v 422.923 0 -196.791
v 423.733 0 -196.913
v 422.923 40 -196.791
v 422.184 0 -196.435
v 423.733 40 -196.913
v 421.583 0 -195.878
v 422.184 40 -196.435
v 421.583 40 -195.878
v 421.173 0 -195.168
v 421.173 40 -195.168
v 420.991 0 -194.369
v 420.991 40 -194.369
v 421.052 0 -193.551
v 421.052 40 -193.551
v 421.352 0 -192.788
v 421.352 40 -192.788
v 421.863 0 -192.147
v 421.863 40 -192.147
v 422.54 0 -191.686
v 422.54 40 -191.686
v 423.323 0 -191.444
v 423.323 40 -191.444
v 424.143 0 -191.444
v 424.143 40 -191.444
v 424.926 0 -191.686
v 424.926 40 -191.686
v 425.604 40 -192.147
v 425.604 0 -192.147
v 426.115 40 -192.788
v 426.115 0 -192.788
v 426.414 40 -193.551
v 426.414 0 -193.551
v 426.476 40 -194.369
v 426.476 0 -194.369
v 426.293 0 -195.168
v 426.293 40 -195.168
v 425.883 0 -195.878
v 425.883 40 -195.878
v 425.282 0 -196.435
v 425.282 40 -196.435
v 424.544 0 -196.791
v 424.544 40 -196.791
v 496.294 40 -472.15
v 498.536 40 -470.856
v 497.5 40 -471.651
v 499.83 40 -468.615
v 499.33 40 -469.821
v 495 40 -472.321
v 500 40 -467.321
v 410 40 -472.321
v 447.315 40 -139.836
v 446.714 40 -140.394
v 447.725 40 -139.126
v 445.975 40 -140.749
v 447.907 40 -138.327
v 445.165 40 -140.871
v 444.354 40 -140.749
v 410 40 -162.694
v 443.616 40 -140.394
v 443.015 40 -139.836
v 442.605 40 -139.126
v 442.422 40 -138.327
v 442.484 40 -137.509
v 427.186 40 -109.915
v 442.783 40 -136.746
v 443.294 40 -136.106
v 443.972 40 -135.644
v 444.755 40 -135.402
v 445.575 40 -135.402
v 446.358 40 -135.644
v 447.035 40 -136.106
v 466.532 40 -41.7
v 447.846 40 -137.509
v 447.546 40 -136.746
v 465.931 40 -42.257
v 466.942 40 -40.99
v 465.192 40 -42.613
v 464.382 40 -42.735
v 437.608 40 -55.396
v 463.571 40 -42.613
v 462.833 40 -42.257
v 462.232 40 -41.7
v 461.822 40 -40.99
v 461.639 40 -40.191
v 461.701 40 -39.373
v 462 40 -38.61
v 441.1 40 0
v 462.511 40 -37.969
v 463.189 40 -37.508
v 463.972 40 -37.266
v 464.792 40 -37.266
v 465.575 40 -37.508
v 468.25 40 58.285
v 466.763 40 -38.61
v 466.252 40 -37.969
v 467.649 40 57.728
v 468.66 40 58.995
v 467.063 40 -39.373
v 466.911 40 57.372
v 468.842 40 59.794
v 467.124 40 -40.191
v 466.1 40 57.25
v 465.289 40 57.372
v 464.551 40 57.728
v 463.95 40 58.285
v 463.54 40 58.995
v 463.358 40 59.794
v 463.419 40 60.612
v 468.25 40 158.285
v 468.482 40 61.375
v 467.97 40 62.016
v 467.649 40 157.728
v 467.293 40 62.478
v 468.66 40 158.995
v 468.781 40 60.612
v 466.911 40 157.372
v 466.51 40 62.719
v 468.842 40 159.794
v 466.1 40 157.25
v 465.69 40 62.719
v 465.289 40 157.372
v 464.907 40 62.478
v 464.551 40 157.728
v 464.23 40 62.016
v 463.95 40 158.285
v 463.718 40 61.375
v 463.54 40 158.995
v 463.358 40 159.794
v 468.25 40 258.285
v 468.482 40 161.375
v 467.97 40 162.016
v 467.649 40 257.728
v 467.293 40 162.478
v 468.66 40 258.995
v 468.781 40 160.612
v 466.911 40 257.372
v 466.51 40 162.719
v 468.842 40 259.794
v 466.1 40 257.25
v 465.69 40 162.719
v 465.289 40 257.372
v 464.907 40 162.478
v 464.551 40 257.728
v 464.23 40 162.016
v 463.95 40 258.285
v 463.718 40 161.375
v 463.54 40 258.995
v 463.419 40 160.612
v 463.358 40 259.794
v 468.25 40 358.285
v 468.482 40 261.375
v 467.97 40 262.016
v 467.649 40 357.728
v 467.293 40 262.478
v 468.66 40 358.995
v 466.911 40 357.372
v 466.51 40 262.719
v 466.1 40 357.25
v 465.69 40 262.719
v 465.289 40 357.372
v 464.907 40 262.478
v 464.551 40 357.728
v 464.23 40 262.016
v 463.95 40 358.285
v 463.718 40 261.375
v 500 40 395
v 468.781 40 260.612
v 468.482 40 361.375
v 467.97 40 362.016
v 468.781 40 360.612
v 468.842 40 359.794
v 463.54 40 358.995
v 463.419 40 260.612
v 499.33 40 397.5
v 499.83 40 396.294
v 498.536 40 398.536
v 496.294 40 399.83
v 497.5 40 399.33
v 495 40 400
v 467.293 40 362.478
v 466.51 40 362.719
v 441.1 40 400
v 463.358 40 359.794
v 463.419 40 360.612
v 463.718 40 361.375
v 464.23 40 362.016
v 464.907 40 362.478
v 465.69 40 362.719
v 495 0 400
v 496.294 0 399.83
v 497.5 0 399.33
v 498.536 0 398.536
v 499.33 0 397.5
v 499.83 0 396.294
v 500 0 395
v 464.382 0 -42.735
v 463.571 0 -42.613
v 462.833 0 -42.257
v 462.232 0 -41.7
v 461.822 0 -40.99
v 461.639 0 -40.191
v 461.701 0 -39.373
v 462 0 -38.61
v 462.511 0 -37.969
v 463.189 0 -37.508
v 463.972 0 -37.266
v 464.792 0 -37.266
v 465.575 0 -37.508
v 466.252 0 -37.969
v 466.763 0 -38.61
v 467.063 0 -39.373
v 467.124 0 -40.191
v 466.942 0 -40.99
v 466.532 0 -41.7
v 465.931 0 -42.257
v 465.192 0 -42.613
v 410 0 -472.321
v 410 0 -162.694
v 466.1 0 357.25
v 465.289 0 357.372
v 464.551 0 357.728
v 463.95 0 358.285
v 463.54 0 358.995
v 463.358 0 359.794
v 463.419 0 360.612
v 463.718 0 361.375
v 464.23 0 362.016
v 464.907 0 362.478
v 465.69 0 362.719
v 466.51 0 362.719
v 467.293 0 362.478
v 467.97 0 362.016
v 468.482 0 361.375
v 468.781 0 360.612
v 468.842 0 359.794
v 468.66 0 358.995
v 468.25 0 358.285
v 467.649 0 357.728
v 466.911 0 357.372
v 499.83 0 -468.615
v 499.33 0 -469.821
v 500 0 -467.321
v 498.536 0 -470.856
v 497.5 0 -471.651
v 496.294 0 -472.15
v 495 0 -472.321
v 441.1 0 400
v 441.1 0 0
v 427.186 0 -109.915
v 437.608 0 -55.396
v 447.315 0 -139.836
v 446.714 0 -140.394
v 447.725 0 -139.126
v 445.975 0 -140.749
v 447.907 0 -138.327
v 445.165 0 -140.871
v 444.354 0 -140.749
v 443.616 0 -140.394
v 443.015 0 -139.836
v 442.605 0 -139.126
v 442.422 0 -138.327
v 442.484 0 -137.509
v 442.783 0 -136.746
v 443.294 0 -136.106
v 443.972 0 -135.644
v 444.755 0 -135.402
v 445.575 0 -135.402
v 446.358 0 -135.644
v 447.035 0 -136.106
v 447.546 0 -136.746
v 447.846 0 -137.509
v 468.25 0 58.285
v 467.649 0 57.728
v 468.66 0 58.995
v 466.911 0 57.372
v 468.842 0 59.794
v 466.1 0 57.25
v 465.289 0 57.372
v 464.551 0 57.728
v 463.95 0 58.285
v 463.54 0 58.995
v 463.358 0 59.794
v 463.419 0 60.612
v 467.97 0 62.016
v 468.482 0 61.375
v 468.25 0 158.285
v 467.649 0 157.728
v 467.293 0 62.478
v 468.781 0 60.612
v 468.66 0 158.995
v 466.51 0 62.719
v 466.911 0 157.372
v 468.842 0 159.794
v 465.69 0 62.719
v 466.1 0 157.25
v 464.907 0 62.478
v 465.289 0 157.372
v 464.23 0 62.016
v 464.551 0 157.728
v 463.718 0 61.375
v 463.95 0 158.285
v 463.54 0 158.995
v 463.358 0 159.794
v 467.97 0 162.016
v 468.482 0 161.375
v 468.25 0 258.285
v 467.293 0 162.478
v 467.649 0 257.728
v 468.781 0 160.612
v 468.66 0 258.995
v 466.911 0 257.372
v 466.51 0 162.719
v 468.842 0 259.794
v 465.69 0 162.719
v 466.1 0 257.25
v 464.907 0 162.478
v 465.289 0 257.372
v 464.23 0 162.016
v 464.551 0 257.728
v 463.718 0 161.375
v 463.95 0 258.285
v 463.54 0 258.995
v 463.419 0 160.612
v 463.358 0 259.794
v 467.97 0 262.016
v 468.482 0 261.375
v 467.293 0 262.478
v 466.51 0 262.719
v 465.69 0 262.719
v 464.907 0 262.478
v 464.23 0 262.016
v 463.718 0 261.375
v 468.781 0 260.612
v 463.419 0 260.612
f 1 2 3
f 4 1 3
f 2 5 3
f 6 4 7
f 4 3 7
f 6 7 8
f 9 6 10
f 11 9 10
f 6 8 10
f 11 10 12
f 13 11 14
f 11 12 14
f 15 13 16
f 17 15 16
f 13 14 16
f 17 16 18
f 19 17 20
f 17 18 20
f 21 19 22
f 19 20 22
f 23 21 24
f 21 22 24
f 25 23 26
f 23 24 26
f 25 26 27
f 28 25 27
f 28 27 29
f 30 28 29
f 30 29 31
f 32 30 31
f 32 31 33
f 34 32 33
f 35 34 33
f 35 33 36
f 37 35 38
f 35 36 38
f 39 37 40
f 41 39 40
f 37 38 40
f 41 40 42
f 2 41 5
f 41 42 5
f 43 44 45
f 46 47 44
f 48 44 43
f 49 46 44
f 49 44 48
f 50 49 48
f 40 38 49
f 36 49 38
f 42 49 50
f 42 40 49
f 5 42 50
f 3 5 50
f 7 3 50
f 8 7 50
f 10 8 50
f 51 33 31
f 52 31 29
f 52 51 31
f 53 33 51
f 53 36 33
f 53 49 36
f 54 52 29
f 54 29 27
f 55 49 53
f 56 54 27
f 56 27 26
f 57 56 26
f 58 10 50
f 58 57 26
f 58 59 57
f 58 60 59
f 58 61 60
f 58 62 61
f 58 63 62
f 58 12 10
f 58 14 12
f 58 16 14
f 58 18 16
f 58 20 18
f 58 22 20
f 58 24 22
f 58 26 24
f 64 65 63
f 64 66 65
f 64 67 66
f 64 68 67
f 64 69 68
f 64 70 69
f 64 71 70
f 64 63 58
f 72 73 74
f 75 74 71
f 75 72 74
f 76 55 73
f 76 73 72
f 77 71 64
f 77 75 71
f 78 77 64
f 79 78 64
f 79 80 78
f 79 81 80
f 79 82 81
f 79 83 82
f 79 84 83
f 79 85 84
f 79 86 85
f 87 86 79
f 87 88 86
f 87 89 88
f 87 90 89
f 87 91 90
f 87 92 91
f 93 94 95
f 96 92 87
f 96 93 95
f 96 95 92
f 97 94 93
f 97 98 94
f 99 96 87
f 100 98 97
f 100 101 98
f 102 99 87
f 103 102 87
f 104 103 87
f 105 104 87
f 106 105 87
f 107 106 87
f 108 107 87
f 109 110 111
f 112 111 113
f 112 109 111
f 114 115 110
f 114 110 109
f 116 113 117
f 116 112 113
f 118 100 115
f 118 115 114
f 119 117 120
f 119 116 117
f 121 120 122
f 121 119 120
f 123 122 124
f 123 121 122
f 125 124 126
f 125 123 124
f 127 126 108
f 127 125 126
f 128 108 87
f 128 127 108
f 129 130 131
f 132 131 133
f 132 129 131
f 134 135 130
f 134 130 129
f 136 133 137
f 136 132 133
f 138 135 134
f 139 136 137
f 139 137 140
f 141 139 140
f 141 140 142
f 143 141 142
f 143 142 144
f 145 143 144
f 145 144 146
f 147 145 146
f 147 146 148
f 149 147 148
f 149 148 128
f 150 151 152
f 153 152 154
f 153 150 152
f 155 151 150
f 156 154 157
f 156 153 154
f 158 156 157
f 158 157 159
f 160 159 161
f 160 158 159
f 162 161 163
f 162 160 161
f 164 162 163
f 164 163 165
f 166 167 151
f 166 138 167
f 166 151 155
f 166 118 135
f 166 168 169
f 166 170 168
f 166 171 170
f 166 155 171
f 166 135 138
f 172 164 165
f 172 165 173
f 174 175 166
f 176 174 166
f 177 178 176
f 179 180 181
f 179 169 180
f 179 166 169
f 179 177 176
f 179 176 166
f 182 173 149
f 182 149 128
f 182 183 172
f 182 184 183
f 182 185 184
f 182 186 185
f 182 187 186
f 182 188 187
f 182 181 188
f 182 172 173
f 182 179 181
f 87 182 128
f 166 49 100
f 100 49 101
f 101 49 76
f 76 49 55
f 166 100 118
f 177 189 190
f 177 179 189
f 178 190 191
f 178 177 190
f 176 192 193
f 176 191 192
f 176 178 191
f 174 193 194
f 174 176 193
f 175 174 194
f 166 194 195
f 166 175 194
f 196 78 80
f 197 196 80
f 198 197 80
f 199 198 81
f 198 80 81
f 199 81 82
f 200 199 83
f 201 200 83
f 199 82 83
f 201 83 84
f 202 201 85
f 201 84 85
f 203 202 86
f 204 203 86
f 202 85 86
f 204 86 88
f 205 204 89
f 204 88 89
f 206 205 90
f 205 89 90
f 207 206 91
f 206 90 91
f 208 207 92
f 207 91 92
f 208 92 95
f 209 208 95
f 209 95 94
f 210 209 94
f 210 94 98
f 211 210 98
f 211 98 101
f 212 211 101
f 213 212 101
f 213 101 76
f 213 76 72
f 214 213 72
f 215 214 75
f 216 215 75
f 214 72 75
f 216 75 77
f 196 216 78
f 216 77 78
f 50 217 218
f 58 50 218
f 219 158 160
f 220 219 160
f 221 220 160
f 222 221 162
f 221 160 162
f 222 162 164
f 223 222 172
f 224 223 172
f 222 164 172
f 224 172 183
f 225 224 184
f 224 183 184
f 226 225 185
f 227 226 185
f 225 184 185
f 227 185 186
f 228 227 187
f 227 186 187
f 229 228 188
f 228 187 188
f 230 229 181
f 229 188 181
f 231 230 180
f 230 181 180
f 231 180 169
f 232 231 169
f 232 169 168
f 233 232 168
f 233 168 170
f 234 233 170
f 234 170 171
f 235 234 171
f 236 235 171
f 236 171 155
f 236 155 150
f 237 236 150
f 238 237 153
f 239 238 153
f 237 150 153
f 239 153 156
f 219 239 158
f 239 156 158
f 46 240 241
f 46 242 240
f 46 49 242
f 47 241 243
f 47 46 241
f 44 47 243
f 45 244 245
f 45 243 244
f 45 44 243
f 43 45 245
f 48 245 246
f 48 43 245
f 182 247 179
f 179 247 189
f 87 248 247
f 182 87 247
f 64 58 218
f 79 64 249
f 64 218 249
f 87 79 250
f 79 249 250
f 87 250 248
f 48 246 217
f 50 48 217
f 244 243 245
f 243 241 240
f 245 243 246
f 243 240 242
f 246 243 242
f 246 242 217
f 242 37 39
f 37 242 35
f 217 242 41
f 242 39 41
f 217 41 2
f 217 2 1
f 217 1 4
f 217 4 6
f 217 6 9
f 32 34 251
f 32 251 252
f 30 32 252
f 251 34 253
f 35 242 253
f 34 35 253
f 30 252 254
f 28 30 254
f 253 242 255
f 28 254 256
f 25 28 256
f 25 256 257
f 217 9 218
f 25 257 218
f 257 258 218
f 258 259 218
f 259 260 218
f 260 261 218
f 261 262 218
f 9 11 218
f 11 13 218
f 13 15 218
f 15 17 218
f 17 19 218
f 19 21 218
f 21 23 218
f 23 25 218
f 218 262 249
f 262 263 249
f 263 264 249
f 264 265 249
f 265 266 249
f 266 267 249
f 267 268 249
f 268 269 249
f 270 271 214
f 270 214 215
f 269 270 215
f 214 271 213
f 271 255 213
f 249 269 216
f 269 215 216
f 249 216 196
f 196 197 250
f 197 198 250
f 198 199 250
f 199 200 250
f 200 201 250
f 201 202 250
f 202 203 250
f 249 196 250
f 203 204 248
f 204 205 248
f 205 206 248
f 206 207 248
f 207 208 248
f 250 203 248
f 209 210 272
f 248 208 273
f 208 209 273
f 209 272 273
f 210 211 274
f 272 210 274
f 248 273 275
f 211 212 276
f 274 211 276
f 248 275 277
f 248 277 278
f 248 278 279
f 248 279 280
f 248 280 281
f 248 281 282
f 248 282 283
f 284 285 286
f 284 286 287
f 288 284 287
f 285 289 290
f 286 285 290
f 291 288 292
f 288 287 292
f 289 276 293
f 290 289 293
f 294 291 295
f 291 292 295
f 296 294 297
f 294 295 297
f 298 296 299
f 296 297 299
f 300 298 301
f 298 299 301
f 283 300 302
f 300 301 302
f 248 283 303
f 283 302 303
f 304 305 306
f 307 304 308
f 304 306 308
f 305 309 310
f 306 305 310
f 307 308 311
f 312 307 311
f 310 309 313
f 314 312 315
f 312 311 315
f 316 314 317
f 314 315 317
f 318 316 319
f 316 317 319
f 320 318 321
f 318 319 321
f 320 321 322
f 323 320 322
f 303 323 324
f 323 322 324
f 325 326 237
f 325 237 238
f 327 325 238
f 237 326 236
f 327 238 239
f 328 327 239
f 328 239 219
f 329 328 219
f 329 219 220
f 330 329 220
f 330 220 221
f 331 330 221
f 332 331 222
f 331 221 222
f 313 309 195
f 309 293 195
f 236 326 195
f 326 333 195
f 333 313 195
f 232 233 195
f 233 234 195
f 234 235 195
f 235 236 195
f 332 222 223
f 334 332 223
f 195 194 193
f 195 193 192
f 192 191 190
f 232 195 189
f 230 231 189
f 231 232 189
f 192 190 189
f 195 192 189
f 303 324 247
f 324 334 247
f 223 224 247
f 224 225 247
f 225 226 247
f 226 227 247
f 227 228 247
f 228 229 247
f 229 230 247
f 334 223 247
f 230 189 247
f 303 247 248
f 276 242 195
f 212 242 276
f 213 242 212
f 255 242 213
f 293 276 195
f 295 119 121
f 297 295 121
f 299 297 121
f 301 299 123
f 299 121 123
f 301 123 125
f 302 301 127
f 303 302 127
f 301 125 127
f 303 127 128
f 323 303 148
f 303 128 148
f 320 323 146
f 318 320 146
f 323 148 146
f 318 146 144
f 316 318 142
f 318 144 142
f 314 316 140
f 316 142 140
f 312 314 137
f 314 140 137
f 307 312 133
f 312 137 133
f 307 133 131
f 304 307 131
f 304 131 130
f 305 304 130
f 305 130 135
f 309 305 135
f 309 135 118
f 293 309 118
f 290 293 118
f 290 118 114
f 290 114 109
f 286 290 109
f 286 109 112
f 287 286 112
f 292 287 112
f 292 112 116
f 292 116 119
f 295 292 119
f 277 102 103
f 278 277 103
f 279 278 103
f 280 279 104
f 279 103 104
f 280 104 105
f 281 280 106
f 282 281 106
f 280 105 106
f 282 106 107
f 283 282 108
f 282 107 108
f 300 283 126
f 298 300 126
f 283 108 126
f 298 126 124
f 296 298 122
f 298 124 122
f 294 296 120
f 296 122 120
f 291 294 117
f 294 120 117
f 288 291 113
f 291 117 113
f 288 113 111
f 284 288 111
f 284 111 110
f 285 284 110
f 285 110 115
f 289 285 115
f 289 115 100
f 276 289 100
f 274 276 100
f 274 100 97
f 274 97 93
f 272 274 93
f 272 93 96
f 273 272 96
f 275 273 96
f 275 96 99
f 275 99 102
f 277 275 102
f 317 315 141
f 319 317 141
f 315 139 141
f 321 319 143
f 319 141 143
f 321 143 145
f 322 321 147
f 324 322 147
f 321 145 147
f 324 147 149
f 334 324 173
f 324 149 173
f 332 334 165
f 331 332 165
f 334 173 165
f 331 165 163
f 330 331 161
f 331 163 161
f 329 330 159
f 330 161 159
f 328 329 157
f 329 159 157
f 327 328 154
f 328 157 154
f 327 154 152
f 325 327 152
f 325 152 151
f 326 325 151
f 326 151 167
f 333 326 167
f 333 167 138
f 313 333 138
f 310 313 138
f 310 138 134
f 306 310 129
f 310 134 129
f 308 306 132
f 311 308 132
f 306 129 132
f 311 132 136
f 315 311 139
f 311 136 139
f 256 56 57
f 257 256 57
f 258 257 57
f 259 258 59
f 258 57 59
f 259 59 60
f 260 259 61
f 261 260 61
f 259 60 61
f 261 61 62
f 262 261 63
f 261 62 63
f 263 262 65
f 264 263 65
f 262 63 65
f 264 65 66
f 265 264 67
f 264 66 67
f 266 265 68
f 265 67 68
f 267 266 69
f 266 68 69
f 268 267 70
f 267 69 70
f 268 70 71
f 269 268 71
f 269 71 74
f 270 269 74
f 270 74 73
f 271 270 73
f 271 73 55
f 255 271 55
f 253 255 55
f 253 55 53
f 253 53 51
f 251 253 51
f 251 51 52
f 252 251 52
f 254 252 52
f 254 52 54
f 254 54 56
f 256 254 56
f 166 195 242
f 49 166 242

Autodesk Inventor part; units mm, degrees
ref_plane "YZ Plane" through (0, 0, 0) normal (1, 0, 0) x (0, 1, 0)
ref_plane "XZ Plane" through (0, 0, 0) normal (0, 1, 0) x (-1, 0, 0)
ref_plane "XY Plane" through (0, 0, 0) normal (0, 0, 1) x (1, 0, 0)
sketch "Sketch1" plane through (0, 0, 0) normal (0, 1, 0) x (-1, 0, 0)
  line L0 (0, 329.241) -> (0, -329.241) construction
  line L1 (203.5937, 0) -> (-203.5937, 0) construction
  arc A0 (-441.1, 0) -> (220, -382.3208) centre (0, 0) ccw
  line L2 (-441.1, 0) -> (-441.1, 400)
  line L3 (-441.1, 400) -> (-500, 400)
  line L4 (-500, 400) -> (-500, -500)
  line L5 (-500, -500) -> (220, -500)
  line L6 (220, -500) -> (220, -382.3208)
  dimension "d0" = 500
  dimension "d1" = 400
  dimension "d2" = 500
  dimension "d3" = 441.1
  dimension "d4" = 720
extrude "Extrusion1" add sketch "Sketch1" along normal blind 40
sketch "Sketch3" plane through (0, 0, 0) normal (0, -1, 0) x (1, 0, 0)
  line L0 (500, -472.3208) -> (410, -472.3208)
  line L1 (410, -472.3208) -> (410, 417.6792)
  line L2 (410, 417.6792) -> (500, 417.6792)
  line L3 (500, 417.6792) -> (500, -472.3208)
  line L4 (500, 400) -> (500, -500) projected
  arc A0 (-220, -382.3208) -> (441.1, 0) centre (0, 0) ccw projected
  line L5 (441.1, 400) -> (500, 400) projected
  line L6 (-562.8742, 618.3402) -> (964.0911, 618.3402)
  line L7 (964.0911, 618.3402) -> (964.0911, -811.0554)
  line L8 (964.0911, -811.0554) -> (-562.8742, -811.0554)
  line L9 (-562.8742, -811.0554) -> (-562.8742, 618.3402)
  dimension "d41" = 890
  dimension "d42" = 90
  dimension "d71" = 17.6792
sketch "Sketch4" plane through (0, 0, 0) normal (0, -1, 0) x (1, 0, 0)
  line L0 (441.1, 400) -> (500, 400) construction
  line L1 (441.1, 0) -> (441.1, 400) construction
  arc A0 (-220, -382.3208) -> (441.1, 0) centre (0, 0) ccw construction
  line L2 (464.3817, -39.9852) -> (0, 0) construction
  line L3 (0, 0) -> (445.1648, -138.1214) construction
  line L4 (423.7332, -194.1633) -> (0, 0) construction
  line L5 (360.2723, -295.7246) -> (0, 0) construction
  line L6 (289.0138, -365.6778) -> (0, 0) construction
  line L7 (389.8771, -255.4312) -> (0, 0) construction
  line L8 (326.5218, -332.615) -> (0, 0) construction
  line L9 (230.9911, -404.8361) -> (0, 0) construction
  line L10 (139.32, -444.7911) -> (0, 0) construction
  line L11 (41.2359, -464.2723) -> (0, 0) construction
  line L12 (464.3817, -39.9852) -> (445.1648, -138.1214) construction
  line L13 (445.1648, -138.1214) -> (423.7332, -194.1633) construction
  line L14 (423.7332, -194.1633) -> (389.8771, -255.4312) construction
  line L15 (389.8771, -255.4312) -> (360.2723, -295.7246) construction
  line L16 (360.2723, -295.7246) -> (326.5218, -332.615) construction
  line L17 (326.5218, -332.615) -> (289.0138, -365.6778) construction
  line L18 (289.0138, -365.6778) -> (230.9911, -404.8361) construction
  line L19 (230.9911, -404.8361) -> (139.32, -444.7911) construction
  line L20 (139.32, -444.7911) -> (41.2359, -464.2723) construction
  line L21 (-58.7462, -462.3831) -> (0, 0) construction
  line L22 (-156.0243, -439.2102) -> (0, 0) construction
  line L23 (-200, -421.0098) -> (0, 0) construction
  line L24 (41.2359, -464.2723) -> (-58.7462, -462.3831) construction
  line L25 (-58.7462, -462.3831) -> (-156.0243, -439.2102) construction
  line L26 (-200, -421.0098) -> (-156.0243, -439.2102) construction
  line L27 (-220, -500) -> (-220, -382.3208) construction
  point P0 (466.1, 360)
  point P1 (466.1, 260)
  point P2 (466.1, 160)
  point P3 (466.1, 60)
  dimension "d50" = 40
  dimension "d51" = 100
  dimension "d52" = 100
  dimension "d53" = 100
  dimension "d54" = 25
  dimension "d55" = 466.1
  dimension "d56" = 100
  dimension "d57" = 100
  dimension "d58" = 60
  dimension "d59" = 70
  dimension "d60" = 50
  dimension "d61" = 70
  dimension "d62" = 100
  dimension "d63" = 20
hole "Hole1" at (-200, 0, -421.0098) at (-156.0243, 0, -439.2102) at (-58.7462, 0, -462.3831) at (41.2359, 0, -464.2723) at (139.32, 0, -444.7911) at (230.9911, 0, -404.8361) at (289.0138, 0, -365.6778) at (326.5218, 0, -332.615) at (360.2723, 0, -295.7246) at (389.8771, 0, -255.4312) at (423.7332, 0, -194.1633) at (445.1648, 0, -138.1214) at (464.3817, 0, -39.9852) at (466.1, 0, 60) at (466.1, 0, 160) at (466.1, 0, 260) at (466.1, 0, 360) direction (0, 1, 0) diameter 5.5 end through all clearance for "Countersunk Flat Head Screw DIN EN ISO 2009" size "M5" standard "DIN"
extrude "Extrusion2" cut sketch "Sketch3" against normal through all
fillet "Fillet1" radius 5 2 edges at (500, 20, 400) (500, 20, -472.3208)
properties part number "boundaryV1"
